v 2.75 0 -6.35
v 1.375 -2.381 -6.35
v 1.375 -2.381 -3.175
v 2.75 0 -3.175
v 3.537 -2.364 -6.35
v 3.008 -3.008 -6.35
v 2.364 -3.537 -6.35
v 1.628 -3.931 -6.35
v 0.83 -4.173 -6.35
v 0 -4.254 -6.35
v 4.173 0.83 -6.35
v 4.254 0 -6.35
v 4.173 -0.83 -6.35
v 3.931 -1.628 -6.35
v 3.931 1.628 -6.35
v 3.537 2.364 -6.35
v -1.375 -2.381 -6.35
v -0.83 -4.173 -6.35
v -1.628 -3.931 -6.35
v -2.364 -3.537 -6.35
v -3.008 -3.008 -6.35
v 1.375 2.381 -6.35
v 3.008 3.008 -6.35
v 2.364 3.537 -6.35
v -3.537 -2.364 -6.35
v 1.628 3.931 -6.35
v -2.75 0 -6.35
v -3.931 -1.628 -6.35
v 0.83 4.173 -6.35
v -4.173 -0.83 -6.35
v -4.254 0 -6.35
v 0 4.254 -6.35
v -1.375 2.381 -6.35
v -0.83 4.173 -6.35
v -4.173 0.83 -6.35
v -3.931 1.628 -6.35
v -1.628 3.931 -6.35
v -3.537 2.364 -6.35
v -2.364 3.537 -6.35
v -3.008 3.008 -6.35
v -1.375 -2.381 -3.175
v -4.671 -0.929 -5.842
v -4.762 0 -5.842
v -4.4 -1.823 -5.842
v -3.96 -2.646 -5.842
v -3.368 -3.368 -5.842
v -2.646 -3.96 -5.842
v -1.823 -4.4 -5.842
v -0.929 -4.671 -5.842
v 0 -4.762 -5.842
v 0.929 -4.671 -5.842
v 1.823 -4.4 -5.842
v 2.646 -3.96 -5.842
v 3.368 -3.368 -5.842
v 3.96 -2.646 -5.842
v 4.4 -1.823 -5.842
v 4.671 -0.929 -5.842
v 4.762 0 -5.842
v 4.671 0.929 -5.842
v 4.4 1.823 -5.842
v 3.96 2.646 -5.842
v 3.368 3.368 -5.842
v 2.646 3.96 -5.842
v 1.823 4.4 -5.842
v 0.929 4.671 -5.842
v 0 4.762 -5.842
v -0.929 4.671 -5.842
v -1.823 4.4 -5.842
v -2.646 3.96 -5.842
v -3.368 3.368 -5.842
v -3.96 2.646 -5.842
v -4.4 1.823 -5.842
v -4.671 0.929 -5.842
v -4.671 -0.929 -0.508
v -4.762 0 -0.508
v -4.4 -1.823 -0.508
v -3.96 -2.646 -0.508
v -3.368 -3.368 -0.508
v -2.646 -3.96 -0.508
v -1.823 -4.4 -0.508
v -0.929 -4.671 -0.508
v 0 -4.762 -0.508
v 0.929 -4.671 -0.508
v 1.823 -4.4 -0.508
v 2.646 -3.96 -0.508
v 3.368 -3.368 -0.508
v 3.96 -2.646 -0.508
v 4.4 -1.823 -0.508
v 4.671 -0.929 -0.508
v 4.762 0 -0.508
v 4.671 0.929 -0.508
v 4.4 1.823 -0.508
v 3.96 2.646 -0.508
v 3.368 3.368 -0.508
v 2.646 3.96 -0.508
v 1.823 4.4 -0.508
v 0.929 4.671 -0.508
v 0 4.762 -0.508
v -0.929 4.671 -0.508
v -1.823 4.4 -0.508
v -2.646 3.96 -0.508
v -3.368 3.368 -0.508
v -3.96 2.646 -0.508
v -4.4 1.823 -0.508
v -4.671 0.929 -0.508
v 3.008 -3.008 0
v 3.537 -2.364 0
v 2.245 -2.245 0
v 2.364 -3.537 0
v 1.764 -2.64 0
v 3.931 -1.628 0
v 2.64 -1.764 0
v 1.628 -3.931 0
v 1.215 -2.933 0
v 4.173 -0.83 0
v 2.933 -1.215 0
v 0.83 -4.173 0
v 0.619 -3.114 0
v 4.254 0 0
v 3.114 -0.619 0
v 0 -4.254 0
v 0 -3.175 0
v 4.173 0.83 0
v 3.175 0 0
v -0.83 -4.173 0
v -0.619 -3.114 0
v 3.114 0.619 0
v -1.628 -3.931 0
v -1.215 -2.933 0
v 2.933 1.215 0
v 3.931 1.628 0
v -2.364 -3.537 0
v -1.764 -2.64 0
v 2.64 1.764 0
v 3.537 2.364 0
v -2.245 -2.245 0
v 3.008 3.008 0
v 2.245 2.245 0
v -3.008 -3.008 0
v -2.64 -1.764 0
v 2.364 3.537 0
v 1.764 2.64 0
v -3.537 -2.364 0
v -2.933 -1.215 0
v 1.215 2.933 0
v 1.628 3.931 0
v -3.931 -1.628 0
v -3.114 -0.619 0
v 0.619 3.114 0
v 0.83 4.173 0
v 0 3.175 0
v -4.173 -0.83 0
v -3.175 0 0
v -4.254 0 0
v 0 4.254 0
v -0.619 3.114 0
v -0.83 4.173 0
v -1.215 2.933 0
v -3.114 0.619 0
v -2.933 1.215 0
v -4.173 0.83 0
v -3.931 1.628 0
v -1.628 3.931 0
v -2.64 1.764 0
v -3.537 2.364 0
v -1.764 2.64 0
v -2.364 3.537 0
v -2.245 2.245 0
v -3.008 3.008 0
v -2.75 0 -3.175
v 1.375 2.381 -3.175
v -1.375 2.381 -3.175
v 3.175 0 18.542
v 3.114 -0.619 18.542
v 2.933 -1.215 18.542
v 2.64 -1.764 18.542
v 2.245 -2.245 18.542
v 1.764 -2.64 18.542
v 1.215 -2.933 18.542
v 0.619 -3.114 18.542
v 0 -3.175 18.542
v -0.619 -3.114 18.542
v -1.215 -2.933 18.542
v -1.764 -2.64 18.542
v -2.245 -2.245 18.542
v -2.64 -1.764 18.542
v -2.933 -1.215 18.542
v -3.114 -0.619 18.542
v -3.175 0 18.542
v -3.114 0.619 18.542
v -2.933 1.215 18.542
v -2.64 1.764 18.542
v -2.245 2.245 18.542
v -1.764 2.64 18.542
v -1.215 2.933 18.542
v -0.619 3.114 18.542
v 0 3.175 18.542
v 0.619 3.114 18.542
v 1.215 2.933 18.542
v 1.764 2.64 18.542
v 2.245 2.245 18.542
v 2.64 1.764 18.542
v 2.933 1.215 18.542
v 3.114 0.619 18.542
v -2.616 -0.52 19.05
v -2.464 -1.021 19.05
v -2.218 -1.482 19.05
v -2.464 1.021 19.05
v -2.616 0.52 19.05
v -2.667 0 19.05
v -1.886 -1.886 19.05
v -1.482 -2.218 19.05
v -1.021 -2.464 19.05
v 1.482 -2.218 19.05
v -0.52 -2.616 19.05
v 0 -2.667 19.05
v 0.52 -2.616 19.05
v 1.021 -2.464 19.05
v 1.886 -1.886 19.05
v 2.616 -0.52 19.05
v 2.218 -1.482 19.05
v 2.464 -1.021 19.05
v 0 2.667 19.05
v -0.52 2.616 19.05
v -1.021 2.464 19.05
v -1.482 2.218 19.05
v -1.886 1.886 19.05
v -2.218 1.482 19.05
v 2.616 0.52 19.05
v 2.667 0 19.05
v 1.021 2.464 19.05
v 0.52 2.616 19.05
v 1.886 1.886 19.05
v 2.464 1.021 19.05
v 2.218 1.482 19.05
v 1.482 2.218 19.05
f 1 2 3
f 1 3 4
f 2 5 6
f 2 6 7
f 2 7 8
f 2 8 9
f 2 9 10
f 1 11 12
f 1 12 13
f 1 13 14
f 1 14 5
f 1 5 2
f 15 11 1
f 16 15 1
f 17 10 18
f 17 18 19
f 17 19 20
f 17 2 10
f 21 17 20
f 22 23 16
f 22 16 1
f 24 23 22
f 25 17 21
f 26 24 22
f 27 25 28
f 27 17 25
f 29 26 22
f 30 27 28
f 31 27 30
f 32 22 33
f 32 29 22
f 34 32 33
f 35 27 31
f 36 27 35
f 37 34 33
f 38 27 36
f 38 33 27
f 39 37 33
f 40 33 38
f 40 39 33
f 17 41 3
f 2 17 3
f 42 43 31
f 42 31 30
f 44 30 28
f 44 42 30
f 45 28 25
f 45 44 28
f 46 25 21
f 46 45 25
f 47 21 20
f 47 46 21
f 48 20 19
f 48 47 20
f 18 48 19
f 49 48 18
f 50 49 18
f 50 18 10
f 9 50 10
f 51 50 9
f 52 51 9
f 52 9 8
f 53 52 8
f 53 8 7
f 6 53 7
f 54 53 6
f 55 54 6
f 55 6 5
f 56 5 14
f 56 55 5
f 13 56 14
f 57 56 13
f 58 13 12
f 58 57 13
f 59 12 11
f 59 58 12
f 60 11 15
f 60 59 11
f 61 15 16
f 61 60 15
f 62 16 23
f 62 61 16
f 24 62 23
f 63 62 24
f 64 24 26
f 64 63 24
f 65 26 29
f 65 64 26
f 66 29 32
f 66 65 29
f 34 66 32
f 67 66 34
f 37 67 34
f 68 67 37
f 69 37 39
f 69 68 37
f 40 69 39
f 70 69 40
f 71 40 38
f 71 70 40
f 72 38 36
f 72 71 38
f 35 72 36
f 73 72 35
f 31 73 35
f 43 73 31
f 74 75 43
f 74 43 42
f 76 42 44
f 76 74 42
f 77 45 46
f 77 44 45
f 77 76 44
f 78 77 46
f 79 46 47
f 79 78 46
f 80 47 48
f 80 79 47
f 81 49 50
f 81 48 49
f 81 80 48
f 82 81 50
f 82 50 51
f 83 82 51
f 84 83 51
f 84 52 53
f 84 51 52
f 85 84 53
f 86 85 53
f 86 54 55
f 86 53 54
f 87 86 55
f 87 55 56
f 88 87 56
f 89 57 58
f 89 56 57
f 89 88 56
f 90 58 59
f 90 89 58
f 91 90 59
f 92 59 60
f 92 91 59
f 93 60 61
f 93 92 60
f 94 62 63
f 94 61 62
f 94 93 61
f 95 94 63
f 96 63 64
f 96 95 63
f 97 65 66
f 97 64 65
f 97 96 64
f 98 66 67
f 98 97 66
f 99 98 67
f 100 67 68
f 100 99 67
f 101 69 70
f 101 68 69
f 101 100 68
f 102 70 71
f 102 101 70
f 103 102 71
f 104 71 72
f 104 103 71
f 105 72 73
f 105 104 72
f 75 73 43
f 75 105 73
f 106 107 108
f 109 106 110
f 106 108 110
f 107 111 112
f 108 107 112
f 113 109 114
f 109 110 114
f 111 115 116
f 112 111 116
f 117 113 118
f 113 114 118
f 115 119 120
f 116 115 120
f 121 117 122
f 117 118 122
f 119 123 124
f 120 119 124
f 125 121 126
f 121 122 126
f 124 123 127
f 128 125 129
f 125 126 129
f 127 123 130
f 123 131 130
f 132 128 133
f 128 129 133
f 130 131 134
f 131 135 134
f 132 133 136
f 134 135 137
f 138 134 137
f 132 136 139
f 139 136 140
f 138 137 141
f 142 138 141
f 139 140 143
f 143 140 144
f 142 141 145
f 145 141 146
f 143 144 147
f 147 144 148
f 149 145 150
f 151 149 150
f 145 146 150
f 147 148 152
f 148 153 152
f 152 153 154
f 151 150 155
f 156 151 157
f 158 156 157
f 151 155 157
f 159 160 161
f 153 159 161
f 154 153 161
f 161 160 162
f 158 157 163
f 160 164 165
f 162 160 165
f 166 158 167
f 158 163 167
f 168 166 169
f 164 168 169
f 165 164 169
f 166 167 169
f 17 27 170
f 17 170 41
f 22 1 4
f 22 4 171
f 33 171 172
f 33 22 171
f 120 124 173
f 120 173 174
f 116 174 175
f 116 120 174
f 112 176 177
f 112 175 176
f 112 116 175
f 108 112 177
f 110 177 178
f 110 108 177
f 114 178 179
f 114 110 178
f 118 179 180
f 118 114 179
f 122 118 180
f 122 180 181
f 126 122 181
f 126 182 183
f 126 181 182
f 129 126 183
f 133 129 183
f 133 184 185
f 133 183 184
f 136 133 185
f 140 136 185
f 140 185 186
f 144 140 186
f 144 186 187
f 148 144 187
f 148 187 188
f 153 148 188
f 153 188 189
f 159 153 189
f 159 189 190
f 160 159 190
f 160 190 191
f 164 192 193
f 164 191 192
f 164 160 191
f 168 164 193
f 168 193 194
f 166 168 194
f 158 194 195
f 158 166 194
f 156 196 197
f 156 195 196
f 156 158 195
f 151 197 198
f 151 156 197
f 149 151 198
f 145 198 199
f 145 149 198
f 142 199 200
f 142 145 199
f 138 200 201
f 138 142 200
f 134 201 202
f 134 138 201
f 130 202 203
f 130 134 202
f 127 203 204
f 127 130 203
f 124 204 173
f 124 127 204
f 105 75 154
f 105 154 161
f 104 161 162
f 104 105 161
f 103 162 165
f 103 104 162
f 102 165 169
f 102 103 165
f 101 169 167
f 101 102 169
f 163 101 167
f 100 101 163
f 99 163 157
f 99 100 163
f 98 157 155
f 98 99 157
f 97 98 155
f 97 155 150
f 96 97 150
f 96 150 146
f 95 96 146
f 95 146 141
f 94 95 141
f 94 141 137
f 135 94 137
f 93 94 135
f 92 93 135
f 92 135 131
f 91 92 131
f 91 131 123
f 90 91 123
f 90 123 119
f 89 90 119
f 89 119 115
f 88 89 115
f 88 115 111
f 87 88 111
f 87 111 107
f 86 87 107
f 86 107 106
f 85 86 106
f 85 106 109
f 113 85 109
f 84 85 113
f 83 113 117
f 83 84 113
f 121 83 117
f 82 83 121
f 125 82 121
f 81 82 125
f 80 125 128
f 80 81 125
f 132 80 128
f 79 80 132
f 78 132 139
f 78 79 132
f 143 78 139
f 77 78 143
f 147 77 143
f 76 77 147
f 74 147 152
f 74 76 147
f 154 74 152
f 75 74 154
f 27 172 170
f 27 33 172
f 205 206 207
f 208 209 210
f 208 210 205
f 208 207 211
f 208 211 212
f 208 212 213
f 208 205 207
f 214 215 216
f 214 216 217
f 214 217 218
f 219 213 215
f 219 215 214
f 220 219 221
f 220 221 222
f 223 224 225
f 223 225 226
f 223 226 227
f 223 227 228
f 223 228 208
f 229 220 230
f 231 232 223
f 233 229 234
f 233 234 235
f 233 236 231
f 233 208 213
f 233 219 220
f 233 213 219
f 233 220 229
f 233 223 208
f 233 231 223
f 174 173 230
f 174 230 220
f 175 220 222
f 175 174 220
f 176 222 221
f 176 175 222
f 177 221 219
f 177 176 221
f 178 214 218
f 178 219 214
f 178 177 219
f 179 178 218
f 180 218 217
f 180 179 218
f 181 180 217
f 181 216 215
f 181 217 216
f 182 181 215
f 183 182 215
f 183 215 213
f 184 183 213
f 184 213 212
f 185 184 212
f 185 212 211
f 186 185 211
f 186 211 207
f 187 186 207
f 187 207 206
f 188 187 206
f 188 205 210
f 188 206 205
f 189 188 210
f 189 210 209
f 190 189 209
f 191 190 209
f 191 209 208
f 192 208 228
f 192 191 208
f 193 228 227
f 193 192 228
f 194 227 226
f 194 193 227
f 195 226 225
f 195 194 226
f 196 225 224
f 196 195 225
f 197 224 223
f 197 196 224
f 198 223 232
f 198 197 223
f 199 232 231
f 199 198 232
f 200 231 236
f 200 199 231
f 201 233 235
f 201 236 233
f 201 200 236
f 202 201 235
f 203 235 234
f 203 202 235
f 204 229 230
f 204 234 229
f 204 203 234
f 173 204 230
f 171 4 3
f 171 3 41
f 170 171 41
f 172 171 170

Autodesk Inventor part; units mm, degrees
ref_plane "YZ Plane" through (0, 0, 0) normal (1, 0, 0) x (0, 1, 0)
ref_plane "XZ Plane" through (0, 0, 0) normal (0, 1, 0) x (-1, 0, 0)
ref_plane "XY Plane" through (0, 0, 0) normal (0, 0, 1) x (1, 0, 0)
sketch "Sketch1" plane through (0, 0, 0) normal (0, 0, 1) x (1, 0, 0)
  circle A0 centre (0, 0) radius 3.175
  dimension "d0" = 6.35
extrude "Extrusion1" add sketch "Sketch1" along normal blind 19.05
sketch "Sketch2" plane through (0, 0, 0) normal (0, 0, -1) x (-1, 0, 0)
  circle A0 centre (0, 0) radius 3.175 projected
  circle A1 centre (0, 0) radius 4.7625
  dimension "d3" = 9.525
extrude "Extrusion2" add sketch "Sketch2" along normal blind 6.35 contours A0 | A1
sketch "Sketch3" plane through (0, 0, -6.35) normal (0, 0, -1) x (-1, 0, 0)
  circle A0 centre (0, 0) radius 4.7625 projected
  line L0 (-1.3748, 2.3812) -> (1.3748, 2.3813)
  line L1 (1.3748, 2.3813) -> (2.7496, 0)
  line L2 (2.7496, 0) -> (1.3748, -2.3812)
  line L3 (1.3748, -2.3812) -> (-1.3748, -2.3812)
  line L4 (-1.3748, -2.3812) -> (-2.7496, 0)
  line L5 (-2.7496, 0) -> (-1.3748, 2.3812)
  dimension "d6" = 4.7625
extrude "Extrusion3" cut sketch "Sketch3" against normal blind 3.175 contours L0 L1 L2 L3 L4 L5
chamfer "Chamfer1" distance 0.508 angle 45 3 edges at (-3.175, 0, 19.05) (4.7625, 0, 0) (4.7625, 0, -6.35)
thread "Thread1" size "1/4-20 UNC" class "2A" standard "ANSI Unified Screw Threads" full length
properties part number "14-20 x750" material "Steel"
